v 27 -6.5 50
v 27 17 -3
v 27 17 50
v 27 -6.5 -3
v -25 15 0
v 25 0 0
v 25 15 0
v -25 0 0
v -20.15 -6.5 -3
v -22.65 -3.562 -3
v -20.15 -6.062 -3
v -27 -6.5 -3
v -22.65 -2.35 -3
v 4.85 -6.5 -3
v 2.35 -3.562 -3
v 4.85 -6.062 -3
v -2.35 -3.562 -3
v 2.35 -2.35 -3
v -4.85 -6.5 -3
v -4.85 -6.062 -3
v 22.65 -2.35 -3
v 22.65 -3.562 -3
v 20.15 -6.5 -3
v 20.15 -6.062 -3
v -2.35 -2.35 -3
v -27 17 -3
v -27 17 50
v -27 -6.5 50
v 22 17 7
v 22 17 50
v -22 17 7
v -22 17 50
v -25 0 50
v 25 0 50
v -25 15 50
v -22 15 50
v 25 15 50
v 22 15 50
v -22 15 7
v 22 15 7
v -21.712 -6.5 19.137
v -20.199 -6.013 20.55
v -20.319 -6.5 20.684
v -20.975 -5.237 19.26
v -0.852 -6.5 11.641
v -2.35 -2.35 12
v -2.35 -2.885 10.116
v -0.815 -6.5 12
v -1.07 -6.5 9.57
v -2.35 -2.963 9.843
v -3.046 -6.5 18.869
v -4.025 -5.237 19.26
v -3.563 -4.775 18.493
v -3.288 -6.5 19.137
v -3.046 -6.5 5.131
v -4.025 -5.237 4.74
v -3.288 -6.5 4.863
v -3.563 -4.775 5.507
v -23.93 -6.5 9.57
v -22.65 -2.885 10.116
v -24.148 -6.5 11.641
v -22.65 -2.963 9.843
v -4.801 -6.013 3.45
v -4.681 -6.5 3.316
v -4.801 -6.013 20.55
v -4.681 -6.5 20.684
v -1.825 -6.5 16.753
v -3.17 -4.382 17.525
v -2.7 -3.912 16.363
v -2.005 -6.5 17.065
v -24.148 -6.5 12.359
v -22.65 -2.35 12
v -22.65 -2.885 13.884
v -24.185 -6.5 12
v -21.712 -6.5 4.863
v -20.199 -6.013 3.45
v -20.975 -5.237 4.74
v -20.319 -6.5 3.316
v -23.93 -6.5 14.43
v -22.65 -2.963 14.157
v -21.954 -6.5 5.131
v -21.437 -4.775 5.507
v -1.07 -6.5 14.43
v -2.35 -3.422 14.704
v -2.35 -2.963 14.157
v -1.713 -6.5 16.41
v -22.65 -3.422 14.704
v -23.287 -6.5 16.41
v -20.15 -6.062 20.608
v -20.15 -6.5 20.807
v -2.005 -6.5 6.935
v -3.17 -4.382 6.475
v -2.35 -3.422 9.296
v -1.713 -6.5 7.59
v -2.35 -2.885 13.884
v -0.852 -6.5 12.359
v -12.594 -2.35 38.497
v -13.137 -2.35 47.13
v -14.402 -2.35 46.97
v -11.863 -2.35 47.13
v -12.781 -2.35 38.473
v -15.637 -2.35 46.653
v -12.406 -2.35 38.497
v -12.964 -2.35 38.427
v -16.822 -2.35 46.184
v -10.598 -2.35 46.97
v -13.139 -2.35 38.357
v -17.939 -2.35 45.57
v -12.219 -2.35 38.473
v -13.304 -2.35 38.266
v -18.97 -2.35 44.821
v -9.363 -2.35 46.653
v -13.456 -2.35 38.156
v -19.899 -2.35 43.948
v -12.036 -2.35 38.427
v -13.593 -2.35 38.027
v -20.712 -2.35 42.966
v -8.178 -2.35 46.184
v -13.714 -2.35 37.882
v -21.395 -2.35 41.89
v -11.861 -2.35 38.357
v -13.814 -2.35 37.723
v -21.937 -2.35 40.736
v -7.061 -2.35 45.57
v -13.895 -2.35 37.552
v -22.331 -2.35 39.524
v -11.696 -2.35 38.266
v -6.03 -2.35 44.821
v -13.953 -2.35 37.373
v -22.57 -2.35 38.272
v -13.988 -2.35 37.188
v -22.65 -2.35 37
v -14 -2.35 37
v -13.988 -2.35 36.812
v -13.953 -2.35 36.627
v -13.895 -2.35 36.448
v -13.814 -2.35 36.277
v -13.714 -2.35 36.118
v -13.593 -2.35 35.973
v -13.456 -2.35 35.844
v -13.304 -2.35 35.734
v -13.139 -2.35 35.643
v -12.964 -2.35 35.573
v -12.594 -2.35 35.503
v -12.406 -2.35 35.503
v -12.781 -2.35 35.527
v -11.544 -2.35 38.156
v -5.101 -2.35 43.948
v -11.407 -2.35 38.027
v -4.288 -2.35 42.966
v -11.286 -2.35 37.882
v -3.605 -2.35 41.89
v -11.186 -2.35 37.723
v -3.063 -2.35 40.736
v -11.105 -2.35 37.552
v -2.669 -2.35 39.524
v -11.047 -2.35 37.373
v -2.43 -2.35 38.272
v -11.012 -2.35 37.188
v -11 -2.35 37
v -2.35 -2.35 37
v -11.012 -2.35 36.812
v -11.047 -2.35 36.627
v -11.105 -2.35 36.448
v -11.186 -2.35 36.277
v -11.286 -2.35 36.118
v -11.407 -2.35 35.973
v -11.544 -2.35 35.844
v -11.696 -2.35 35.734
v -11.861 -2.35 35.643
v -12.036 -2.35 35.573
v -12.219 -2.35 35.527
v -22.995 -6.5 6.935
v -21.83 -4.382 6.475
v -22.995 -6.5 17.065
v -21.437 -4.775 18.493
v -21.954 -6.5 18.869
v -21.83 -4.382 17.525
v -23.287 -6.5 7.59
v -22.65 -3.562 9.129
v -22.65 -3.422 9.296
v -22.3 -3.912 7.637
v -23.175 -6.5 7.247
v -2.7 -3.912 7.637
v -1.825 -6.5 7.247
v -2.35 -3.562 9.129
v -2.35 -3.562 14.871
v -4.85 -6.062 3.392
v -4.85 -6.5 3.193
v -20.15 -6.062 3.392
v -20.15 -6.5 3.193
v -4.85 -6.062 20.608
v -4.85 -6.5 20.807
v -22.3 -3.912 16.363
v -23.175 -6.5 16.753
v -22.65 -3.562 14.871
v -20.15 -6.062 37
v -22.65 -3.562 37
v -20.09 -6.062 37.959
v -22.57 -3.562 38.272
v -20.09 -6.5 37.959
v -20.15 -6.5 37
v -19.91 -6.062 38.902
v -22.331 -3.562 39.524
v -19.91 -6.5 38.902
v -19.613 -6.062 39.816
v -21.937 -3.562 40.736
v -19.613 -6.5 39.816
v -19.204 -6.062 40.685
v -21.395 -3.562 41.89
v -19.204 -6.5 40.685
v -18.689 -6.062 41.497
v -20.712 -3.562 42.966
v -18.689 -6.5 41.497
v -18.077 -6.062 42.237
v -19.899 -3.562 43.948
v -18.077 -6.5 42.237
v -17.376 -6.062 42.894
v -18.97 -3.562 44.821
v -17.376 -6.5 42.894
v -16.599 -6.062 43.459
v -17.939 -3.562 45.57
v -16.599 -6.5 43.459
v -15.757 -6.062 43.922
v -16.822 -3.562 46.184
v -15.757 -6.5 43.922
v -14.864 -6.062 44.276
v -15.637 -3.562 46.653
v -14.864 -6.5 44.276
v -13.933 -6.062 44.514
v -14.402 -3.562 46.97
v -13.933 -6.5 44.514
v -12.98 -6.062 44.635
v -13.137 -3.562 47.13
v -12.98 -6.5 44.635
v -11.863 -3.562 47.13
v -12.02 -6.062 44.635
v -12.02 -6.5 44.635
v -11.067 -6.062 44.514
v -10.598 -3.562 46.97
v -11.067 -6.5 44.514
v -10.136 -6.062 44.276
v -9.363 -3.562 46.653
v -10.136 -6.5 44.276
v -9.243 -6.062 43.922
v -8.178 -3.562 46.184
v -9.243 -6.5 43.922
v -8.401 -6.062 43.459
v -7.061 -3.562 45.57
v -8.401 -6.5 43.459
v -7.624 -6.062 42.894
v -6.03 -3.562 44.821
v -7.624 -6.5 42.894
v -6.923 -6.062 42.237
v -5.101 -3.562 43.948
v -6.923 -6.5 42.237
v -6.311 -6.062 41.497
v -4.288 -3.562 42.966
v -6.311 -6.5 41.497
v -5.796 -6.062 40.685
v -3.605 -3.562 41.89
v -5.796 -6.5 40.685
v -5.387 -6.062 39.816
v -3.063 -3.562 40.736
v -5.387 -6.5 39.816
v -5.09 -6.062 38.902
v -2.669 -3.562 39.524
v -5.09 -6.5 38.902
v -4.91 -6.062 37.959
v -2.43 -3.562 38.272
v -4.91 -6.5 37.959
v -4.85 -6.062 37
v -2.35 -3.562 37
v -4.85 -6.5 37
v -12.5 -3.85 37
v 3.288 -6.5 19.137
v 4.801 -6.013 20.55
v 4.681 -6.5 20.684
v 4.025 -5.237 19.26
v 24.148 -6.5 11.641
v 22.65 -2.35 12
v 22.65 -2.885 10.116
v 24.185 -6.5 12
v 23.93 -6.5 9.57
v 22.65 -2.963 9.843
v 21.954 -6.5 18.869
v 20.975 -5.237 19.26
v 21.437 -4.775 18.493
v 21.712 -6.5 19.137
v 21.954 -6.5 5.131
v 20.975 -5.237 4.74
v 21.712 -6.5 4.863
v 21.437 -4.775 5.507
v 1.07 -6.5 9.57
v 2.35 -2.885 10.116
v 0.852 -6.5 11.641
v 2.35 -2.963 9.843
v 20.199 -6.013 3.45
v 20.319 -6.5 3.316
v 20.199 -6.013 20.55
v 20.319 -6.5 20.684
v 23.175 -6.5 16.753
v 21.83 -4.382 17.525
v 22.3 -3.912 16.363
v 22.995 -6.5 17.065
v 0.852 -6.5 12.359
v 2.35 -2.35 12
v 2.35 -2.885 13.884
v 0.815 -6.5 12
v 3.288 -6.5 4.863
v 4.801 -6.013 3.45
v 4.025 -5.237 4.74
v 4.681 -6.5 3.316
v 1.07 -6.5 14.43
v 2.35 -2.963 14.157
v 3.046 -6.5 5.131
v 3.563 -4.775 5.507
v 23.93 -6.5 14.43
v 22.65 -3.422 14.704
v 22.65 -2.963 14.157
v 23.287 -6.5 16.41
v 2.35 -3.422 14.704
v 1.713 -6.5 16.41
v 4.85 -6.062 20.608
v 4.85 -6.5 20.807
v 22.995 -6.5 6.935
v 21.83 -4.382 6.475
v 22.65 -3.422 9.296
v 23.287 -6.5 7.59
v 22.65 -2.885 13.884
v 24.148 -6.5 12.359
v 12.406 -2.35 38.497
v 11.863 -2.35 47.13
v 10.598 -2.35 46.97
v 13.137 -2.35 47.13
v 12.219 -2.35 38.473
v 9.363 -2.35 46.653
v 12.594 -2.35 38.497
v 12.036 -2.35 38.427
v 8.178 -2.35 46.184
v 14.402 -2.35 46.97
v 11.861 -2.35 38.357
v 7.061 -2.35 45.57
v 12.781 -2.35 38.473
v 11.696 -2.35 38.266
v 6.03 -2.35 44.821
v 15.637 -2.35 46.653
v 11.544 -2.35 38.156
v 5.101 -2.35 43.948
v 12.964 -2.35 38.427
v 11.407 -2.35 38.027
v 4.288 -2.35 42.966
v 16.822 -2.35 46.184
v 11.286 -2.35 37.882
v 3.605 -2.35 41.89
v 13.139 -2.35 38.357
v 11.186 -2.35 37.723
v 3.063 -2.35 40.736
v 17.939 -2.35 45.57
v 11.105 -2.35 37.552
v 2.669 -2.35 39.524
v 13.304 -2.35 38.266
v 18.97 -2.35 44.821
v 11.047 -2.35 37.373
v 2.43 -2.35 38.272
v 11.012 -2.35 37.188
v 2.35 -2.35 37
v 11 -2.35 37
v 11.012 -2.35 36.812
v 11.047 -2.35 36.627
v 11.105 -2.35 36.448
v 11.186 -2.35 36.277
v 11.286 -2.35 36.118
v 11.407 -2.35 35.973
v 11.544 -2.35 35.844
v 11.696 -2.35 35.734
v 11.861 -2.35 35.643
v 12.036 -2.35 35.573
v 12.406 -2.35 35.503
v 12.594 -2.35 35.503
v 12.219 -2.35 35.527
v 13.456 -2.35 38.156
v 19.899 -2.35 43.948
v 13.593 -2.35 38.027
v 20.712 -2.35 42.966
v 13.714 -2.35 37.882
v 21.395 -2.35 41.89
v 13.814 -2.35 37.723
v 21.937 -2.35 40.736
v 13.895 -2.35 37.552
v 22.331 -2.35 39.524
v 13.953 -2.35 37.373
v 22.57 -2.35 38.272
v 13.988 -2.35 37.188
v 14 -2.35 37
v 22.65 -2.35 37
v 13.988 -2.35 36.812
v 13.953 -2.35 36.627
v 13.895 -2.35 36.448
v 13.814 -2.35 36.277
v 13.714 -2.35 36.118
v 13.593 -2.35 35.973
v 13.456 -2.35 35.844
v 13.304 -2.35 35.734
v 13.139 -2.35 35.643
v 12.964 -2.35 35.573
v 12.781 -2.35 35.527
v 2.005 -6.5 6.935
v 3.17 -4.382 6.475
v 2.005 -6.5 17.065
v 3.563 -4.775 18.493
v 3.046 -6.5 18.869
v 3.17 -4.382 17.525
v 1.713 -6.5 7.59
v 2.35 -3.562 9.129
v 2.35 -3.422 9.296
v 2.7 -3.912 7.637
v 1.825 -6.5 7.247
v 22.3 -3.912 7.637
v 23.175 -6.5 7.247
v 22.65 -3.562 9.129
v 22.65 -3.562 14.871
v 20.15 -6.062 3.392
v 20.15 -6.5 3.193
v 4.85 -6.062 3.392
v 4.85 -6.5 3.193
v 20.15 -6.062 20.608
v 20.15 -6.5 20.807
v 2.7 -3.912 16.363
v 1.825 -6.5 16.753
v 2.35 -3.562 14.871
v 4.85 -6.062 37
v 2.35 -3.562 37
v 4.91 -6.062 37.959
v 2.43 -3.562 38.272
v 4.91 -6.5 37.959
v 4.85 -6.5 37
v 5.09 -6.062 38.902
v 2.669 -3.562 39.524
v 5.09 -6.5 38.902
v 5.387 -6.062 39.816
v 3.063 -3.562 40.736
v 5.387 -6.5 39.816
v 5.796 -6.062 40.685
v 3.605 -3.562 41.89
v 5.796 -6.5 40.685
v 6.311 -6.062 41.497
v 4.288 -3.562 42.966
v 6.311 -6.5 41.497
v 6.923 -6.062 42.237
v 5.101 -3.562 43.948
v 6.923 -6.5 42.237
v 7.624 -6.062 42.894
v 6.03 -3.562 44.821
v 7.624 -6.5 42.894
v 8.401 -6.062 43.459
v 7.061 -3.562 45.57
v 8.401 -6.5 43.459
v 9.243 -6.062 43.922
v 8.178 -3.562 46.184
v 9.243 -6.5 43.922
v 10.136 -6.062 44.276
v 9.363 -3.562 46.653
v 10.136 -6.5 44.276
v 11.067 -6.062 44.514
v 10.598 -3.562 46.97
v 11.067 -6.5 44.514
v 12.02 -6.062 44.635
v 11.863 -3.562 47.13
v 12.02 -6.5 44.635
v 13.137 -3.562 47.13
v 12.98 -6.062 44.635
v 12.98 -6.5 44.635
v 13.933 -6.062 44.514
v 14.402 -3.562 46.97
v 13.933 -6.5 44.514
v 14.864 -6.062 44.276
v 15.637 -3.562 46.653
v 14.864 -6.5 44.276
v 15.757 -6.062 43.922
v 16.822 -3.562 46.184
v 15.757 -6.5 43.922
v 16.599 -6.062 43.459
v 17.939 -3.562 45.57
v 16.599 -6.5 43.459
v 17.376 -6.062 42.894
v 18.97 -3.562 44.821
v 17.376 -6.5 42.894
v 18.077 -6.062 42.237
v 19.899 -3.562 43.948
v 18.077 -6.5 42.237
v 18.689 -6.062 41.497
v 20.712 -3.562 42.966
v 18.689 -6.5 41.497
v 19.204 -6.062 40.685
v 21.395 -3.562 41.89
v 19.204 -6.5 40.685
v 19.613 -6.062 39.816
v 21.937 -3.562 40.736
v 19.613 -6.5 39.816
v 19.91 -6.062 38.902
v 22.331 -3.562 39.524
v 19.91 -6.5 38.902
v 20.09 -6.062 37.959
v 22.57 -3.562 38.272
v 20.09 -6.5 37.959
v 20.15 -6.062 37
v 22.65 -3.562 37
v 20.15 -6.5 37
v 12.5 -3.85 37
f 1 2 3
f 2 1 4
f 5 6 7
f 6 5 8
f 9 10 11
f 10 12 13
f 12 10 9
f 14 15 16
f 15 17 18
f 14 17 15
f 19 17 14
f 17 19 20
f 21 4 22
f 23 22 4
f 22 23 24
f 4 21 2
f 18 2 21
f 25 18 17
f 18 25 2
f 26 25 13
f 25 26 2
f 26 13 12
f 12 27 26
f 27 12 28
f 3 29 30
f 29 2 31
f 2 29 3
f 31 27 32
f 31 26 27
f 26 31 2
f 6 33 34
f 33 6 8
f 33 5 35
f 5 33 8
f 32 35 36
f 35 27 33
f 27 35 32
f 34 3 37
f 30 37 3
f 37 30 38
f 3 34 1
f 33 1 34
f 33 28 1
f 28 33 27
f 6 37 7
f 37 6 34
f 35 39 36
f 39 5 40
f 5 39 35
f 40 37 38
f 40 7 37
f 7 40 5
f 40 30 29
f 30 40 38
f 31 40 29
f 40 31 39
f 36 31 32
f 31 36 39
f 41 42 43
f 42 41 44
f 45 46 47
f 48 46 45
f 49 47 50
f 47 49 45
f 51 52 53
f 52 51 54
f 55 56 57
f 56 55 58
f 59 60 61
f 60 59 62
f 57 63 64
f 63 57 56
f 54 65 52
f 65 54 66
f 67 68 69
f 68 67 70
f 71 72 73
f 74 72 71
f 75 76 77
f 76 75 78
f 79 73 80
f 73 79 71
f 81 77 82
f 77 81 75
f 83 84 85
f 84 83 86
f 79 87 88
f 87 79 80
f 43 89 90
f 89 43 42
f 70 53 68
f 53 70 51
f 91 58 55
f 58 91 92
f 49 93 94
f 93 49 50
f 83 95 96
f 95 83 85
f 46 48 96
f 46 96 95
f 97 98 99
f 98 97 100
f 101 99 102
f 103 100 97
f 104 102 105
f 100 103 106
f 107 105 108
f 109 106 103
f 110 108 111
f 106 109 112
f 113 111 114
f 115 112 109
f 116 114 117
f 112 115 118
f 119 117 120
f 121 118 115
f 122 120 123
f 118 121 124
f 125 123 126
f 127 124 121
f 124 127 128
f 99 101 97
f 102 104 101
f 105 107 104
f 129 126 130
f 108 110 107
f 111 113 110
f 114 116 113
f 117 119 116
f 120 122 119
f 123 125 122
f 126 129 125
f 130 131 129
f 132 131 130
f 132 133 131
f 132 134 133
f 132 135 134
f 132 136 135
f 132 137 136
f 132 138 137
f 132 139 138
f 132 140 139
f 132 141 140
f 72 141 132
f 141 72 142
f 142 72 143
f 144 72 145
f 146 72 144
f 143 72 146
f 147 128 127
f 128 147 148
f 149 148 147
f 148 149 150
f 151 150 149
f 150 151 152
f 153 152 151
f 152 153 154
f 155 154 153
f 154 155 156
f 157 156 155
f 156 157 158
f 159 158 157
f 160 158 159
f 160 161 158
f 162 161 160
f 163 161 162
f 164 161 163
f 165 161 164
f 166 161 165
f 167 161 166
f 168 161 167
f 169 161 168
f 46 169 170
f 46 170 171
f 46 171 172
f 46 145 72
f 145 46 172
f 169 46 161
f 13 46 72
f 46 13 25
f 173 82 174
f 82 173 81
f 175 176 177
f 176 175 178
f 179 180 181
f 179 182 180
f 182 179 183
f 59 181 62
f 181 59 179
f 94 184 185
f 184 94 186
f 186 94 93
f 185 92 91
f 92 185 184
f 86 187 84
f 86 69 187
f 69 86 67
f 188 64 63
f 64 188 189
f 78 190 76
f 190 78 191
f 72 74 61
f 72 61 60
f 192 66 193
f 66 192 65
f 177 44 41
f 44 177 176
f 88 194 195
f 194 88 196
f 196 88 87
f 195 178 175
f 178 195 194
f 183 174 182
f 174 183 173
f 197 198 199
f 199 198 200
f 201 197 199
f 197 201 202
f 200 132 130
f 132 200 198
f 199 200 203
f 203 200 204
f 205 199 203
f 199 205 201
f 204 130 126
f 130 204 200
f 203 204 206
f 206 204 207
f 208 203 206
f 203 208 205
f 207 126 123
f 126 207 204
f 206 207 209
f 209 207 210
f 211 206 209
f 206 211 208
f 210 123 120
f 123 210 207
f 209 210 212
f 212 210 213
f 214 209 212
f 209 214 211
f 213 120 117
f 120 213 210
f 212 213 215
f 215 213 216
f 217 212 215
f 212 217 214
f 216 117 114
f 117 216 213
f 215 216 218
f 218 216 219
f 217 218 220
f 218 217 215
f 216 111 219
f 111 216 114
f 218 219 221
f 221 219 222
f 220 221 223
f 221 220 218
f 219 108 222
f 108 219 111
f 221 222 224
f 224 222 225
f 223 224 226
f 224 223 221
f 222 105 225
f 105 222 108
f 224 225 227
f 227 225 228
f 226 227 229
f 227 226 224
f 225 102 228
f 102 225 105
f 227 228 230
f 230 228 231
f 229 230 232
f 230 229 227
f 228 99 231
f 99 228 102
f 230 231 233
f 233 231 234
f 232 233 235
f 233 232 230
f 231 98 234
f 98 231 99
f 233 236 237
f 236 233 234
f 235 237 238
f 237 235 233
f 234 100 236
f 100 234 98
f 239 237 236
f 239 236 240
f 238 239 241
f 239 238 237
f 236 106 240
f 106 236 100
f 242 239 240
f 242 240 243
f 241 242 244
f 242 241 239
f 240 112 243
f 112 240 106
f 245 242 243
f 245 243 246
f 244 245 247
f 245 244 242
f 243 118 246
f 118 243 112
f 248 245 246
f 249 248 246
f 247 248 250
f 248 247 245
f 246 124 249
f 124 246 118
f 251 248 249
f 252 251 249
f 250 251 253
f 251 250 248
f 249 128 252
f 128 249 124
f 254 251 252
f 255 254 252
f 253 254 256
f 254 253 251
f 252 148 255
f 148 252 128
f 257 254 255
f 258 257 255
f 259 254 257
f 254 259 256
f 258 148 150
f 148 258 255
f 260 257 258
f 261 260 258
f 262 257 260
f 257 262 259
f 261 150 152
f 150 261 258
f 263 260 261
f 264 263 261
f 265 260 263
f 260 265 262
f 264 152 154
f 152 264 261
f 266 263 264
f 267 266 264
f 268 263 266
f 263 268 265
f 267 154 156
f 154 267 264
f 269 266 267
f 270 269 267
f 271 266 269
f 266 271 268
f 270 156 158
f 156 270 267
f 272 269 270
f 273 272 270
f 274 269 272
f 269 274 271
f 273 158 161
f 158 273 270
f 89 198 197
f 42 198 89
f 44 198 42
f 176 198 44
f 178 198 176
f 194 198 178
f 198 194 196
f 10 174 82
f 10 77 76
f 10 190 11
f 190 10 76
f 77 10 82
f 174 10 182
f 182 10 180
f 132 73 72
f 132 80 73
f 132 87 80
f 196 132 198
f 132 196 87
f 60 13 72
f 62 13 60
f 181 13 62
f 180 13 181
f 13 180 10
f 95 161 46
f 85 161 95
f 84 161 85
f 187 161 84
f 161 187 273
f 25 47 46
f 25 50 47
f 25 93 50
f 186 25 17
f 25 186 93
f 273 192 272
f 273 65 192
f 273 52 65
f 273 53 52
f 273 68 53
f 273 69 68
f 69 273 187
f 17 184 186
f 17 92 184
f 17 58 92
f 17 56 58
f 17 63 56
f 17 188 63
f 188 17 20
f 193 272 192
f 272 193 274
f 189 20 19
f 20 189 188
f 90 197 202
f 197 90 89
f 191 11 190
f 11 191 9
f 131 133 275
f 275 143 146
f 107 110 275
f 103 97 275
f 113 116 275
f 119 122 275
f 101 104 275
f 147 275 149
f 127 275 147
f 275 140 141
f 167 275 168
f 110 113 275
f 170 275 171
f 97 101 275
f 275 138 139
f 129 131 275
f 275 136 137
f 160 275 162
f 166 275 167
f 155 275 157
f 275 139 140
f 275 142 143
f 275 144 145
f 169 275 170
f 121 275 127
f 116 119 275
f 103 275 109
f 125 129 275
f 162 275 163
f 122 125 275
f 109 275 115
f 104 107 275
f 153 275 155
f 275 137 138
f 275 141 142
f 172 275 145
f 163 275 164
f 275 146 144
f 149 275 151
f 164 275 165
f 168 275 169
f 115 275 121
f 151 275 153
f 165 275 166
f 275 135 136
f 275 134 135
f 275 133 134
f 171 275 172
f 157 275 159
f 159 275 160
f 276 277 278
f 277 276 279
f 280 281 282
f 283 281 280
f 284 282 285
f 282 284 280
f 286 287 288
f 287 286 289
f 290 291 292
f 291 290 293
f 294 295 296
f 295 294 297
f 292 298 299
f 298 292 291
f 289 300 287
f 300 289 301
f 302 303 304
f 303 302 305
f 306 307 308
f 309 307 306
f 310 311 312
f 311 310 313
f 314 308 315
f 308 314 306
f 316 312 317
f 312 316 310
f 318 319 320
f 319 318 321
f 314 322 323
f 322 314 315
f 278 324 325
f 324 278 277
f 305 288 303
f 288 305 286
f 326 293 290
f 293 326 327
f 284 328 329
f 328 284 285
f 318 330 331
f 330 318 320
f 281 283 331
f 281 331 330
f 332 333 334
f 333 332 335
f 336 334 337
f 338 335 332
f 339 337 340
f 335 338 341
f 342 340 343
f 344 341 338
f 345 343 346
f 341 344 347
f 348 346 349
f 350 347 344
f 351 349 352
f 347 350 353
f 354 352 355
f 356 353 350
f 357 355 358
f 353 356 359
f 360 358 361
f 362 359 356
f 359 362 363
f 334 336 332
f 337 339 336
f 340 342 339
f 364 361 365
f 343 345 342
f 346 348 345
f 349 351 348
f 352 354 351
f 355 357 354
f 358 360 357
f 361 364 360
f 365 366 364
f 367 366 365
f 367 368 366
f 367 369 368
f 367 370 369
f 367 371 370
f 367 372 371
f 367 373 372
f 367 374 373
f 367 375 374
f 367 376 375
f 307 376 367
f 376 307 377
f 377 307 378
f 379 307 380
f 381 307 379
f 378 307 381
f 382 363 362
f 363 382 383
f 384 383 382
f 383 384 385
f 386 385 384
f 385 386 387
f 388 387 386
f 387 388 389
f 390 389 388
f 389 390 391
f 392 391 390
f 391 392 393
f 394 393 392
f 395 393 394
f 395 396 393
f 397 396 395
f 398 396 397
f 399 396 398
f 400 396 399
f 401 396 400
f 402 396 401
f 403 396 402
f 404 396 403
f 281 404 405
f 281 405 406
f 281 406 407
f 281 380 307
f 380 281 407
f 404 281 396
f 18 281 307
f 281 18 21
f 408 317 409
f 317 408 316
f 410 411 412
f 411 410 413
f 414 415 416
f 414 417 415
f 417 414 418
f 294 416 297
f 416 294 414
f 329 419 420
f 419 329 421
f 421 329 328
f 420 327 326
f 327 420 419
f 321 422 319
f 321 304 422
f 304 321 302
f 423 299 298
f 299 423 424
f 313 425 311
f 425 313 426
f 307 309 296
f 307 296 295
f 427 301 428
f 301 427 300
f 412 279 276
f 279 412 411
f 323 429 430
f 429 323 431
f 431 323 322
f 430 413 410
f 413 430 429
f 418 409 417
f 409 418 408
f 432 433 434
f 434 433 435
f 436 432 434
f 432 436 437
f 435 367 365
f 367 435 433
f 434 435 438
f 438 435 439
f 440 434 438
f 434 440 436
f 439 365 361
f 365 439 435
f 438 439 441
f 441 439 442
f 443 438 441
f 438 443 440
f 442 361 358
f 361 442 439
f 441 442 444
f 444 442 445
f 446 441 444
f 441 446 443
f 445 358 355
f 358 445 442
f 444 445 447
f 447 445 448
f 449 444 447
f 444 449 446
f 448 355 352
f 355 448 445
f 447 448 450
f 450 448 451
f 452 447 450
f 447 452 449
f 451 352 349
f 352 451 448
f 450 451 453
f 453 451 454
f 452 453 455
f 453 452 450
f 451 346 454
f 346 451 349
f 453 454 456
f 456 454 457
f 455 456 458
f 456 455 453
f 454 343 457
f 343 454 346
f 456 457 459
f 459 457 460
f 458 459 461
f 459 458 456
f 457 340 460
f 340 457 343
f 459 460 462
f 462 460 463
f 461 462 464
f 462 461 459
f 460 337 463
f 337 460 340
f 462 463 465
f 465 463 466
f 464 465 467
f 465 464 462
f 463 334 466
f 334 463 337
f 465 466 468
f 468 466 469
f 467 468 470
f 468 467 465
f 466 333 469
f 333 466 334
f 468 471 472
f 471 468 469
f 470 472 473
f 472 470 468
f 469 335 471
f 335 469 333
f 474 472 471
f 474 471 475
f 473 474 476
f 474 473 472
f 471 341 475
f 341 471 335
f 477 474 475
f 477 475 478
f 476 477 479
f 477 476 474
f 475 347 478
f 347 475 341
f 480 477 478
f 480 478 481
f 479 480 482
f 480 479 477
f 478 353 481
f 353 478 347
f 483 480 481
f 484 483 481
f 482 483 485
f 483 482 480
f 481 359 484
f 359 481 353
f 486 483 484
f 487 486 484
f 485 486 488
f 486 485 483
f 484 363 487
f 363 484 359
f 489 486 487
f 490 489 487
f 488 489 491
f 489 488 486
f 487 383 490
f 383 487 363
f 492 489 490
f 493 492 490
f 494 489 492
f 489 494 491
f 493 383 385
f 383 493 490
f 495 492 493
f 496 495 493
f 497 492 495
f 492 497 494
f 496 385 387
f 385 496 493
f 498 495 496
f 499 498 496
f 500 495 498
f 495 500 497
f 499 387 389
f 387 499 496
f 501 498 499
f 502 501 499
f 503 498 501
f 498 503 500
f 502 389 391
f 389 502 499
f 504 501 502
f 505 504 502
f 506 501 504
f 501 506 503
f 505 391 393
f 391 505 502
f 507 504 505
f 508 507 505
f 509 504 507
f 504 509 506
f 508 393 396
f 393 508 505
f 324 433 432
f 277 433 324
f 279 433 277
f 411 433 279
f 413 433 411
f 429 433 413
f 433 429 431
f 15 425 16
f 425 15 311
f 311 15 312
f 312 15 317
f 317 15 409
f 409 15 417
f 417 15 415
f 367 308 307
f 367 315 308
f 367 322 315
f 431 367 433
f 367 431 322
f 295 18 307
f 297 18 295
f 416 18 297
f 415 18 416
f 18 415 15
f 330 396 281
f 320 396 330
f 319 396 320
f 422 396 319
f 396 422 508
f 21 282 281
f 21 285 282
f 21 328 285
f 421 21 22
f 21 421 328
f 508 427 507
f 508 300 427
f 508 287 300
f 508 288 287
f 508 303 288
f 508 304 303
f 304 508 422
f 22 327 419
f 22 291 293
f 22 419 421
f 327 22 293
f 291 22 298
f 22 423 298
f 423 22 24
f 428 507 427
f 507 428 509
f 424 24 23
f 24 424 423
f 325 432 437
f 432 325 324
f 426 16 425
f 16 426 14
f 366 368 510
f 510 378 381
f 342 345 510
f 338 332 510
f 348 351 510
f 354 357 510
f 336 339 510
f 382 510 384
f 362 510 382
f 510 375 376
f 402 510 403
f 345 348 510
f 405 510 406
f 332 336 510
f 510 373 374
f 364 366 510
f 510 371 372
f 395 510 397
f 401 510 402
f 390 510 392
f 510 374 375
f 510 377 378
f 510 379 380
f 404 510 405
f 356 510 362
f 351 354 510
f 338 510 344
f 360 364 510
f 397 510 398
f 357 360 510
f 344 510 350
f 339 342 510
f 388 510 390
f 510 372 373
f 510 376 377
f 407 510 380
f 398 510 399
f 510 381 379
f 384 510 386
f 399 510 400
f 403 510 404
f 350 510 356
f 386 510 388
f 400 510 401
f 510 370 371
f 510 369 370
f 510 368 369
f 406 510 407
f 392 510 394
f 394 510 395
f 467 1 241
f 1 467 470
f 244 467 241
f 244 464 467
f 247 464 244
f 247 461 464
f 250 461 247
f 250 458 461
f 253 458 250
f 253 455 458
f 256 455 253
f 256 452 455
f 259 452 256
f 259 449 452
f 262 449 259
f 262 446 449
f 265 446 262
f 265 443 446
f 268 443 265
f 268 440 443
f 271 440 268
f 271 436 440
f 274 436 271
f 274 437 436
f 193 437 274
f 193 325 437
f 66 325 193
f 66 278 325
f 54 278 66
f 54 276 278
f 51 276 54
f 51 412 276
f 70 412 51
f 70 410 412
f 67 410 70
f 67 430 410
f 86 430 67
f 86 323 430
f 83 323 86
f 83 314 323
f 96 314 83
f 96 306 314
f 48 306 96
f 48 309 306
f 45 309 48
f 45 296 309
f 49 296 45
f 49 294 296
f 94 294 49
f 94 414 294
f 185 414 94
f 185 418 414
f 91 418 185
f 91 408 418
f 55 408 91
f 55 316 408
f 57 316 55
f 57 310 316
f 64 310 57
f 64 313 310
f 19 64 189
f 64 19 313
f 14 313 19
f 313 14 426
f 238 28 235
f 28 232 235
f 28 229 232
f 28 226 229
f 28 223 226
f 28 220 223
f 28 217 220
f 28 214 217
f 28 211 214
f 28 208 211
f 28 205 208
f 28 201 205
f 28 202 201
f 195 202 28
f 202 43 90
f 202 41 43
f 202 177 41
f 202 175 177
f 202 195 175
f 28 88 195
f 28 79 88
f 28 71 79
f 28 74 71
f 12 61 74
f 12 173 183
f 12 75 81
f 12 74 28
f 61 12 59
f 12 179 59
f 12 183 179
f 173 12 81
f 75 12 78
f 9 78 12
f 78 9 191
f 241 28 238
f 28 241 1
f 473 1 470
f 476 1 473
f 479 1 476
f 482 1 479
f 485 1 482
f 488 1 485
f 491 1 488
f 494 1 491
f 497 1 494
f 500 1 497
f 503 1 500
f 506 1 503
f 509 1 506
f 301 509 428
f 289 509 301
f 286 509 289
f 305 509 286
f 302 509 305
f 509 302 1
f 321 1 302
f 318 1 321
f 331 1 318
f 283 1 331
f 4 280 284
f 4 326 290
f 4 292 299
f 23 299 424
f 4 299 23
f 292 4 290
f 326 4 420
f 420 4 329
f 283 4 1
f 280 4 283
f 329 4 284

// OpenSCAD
/*Created by Andy Levesque
Credit to @David D on Printables and Jonathan at Keep Making for Multiconnect and Multiboard, respectively
Licensed Creative Commons 4.0 Attribution Non-Commercial Sharable with Attribution

Notes:
- Slot test fit - For a slot test fit, set the following parameters
    - internalDepth = 0
    - internalHeight = 25
    - internalWidth = 0
    - wallThickness = 0
*/

/* [Internal Dimensions] */
//Height (in mm) from the top of the back to the base of the internal floor
internalHeight = 50.0; //.1
//Width (in mm) of the internal dimension or item you wish to hold
internalWidth = 50.0; //.1
//Length (i.e., distance from back) (in mm) of the internal dimension or item you wish to hold
internalDepth = 15.0; //.1

/* [Front Cutout Customizations] */
//cut out the front
frontCutout = true; 
//Distance upward from the bottom (in mm) that captures the bottom front of the item
frontLowerCapture = 7;
//Distance downward from the top (in mm) that captures the top front of the item. Use zero (0) for a cutout top. May require printing supports if used. 
frontUpperCapture = 0;
//Distance inward from the sides (in mm) that captures the sides of the item
frontLateralCapture = 3;


/*[Bottom Cutout Customizations]*/
//Cut out the bottom 
bottomCutout = false;
//Distance inward from the front (in mm) that captures the bottom of the item
bottomFrontCapture = 3;
//Distance inward from the back (in mm) that captures the bottom of the item
bottomBackCapture = 3;
//Distance inward from the sides (in mm) that captures the bottom of the item
bottomSideCapture = 3;

/*[Cord Cutout Customizations]*/
//cut out a slot on the bottom and through the front for a cord to connect to the device
cordCutout = false;
//diameter/width of cord cutout
cordCutoutDiameter = 10;
//move the cord cutout left (positive) or right (negative) (in mm)
cordCutoutLateralOffset = 0;
//move the cord cutout forward (positive) and back (negative) (in mm)
cordCutoutDepthOffset = 0;

/* [Right Cutout Customizations] */
rightCutout = false; 
//Distance upward from the bottom (in mm) that captures the bottom right of the item
rightLowerCapture = 7;
//Distance downward from the top (in mm) that captures the bottom right of the item. Use zero (0) for a cutout top. May require printing supports if used. 
rightUpperCapture = 0;
//Distance inward from the sides (in mm) that captures the sides of the item
rightLateralCapture = 3;


/* [Left Cutout Customizations] */
leftCutout = false; 
//Distance upward from the bottom (in mm) that captures the upper left of the item
leftLowerCapture = 7;
//Distance downward from the top (in mm) that captures the upper left of the item. Use zero (0) for a cutout top. May require printing supports if used. 
leftUpperCapture = 0;
//Distance inward from the sides (in mm) that captures the sides of the item
leftLateralCapture = 3;


/* [Additional Customization] */
//Thickness of bin walls (in mm)
wallThickness = 2; //.1
//Thickness of bin  (in mm)
baseThickness = 3; //.1

/*[Slot Customization]*/
//Distance between Multiconnect slots on the back (25mm is standard for MultiBoard)
distanceBetweenSlots = 25;
//QuickRelease removes the small indent in the top of the slots that lock the part into place
slotQuickRelease = false;
//Dimple scale tweaks the size of the dimple in the slot for printers that need a larger dimple to print correctly
dimpleScale = 1; //[0.5:.05:1.5]
//Scale the size of slots in the back (1.015 scale is default for a tight fit. Increase if your finding poor fit. )
slotTolerance = 1.00; //[0.925:0.005:1.075]
//Move the slot in (positive) or out (negative)
slotDepthMicroadjustment = 0; //[-.5:0.05:.5]
//enable a slot on-ramp for easy mounting of tall items
onRampEnabled = true;
//frequency of slots for on-ramp. 1 = every slot; 2 = every 2 slots; etc.
onRampEveryXSlots = 1;

/* [Hidden] */

//Calculated
totalHeight = internalHeight+baseThickness;
totalDepth = internalDepth + wallThickness;
totalWidth = internalWidth + wallThickness*2;
totalCenterX = internalWidth/2;

//move to center
translate(v = [-internalWidth/2,0,0]) 
    basket();
    //slotted back
translate([-max(totalWidth,distanceBetweenSlots)/2,0,-baseThickness])
    multiconnectBack(backWidth = totalWidth, backHeight = totalHeight, distanceBetweenSlots = distanceBetweenSlots);

//Create Basket
module basket() {
    difference() {
        union() {
            //bottom
            translate([-wallThickness,0,-baseThickness])
                cube([internalWidth + wallThickness*2, internalDepth + wallThickness,baseThickness]);

            //left wall
            translate([-wallThickness,0,0])
                cube([wallThickness, internalDepth + wallThickness, internalHeight]);

            //right wall
            translate([internalWidth,0,0])
                cube([wallThickness, internalDepth + wallThickness, internalHeight]);

            //front wall
                translate([0,internalDepth,0])
                    cube([internalWidth,wallThickness,internalHeight]);
        }

        //frontCaptureDeleteTool for item holders
            if (frontCutout == true)
                translate([frontLateralCapture,internalDepth-1,frontLowerCapture])
                    cube([internalWidth-frontLateralCapture*2,wallThickness+2,internalHeight-frontLowerCapture-frontUpperCapture+0.01]);
            if (bottomCutout == true)
                translate(v = [bottomSideCapture,bottomBackCapture,-baseThickness-1]) 
                    cube([internalWidth-bottomSideCapture*2,internalDepth-bottomFrontCapture-bottomBackCapture,baseThickness+2]);
                    //frontCaptureDeleteTool for item holders
            if (rightCutout == true)
                translate([-wallThickness-1,rightLateralCapture,rightLowerCapture])
                    cube([wallThickness+2,internalDepth-rightLateralCapture*2,internalHeight-rightLowerCapture-rightUpperCapture+0.01]);
            if (leftCutout == true)
                translate([internalWidth-1,leftLateralCapture,leftLowerCapture])
                    cube([wallThickness+2,internalDepth-leftLateralCapture*2,internalHeight-leftLowerCapture-leftUpperCapture+0.01]);
            if (cordCutout == true) {
                translate(v = [internalWidth/2+cordCutoutLateralOffset,internalDepth/2+cordCutoutDepthOffset,-baseThickness-1]) {
                    union(){
                        cylinder(h = baseThickness + frontLowerCapture + 2, r = cordCutoutDiameter/2);
                        translate(v = [-cordCutoutDiameter/2,0,0]) cube([cordCutoutDiameter,internalWidth/2+wallThickness+1,baseThickness + frontLowerCapture + 2]);
                    }
                }
            }
    }
    
}


//BEGIN MODULES
//Slotted back Module
module multiconnectBack(backWidth, backHeight, distanceBetweenSlots)
{
    //slot count calculates how many slots can fit on the back. Based on internal width for buffer. 
    //slot width needs to be at least the distance between slot for at least 1 slot to generate
    let (backWidth = max(backWidth,distanceBetweenSlots), backHeight = max(backHeight, 25),slotCount = floor(backWidth/distanceBetweenSlots), backThickness = 6.5){
        difference() {
            translate(v = [0,-backThickness,0]) cube(size = [backWidth,backThickness,backHeight]);
            //Loop through slots and center on the item
            //Note: I kept doing math until it looked right. It's possible this can be simplified.
            for (slotNum = [0:1:slotCount-1]) {
                translate(v = [distanceBetweenSlots/2+(backWidth/distanceBetweenSlots-slotCount)*distanceBetweenSlots/2+slotNum*distanceBetweenSlots,-2.35+slotDepthMicroadjustment,backHeight-13]) {
                    slotTool(backHeight);
                }
            }
        }
    }
    //Create Slot Tool
    module slotTool(totalHeight) {
        scale(v = slotTolerance)
        //slot minus optional dimple with optional on-ramp
        let (slotProfile = [[0,0],[10.15,0],[10.15,1.2121],[7.65,3.712],[7.65,5],[0,5]])
        difference() {
            union() {
                //round top
                rotate(a = [90,0,0,]) 
                    rotate_extrude($fn=50) 
                        polygon(points = slotProfile);
                //long slot
                translate(v = [0,0,0]) 
                    rotate(a = [180,0,0]) 
                    linear_extrude(height = totalHeight+1) 
                        union(){
                            polygon(points = slotProfile);
                            mirror([1,0,0])
                                polygon(points = slotProfile);
                        }
                //on-ramp
                if(onRampEnabled)
                    for(y = [1:onRampEveryXSlots:totalHeight/distanceBetweenSlots])
                        translate(v = [0,-5,-y*distanceBetweenSlots]) 
                            rotate(a = [-90,0,0]) 
                                cylinder(h = 5, r1 = 12, r2 = 10.15);
            }
            //dimple
            if (slotQuickRelease == false)
                scale(v = dimpleScale) 
                rotate(a = [90,0,0,]) 
                    rotate_extrude($fn=50) 
                        polygon(points = [[0,0],[0,1.5],[1.5,0]]);
        }
    }
}
